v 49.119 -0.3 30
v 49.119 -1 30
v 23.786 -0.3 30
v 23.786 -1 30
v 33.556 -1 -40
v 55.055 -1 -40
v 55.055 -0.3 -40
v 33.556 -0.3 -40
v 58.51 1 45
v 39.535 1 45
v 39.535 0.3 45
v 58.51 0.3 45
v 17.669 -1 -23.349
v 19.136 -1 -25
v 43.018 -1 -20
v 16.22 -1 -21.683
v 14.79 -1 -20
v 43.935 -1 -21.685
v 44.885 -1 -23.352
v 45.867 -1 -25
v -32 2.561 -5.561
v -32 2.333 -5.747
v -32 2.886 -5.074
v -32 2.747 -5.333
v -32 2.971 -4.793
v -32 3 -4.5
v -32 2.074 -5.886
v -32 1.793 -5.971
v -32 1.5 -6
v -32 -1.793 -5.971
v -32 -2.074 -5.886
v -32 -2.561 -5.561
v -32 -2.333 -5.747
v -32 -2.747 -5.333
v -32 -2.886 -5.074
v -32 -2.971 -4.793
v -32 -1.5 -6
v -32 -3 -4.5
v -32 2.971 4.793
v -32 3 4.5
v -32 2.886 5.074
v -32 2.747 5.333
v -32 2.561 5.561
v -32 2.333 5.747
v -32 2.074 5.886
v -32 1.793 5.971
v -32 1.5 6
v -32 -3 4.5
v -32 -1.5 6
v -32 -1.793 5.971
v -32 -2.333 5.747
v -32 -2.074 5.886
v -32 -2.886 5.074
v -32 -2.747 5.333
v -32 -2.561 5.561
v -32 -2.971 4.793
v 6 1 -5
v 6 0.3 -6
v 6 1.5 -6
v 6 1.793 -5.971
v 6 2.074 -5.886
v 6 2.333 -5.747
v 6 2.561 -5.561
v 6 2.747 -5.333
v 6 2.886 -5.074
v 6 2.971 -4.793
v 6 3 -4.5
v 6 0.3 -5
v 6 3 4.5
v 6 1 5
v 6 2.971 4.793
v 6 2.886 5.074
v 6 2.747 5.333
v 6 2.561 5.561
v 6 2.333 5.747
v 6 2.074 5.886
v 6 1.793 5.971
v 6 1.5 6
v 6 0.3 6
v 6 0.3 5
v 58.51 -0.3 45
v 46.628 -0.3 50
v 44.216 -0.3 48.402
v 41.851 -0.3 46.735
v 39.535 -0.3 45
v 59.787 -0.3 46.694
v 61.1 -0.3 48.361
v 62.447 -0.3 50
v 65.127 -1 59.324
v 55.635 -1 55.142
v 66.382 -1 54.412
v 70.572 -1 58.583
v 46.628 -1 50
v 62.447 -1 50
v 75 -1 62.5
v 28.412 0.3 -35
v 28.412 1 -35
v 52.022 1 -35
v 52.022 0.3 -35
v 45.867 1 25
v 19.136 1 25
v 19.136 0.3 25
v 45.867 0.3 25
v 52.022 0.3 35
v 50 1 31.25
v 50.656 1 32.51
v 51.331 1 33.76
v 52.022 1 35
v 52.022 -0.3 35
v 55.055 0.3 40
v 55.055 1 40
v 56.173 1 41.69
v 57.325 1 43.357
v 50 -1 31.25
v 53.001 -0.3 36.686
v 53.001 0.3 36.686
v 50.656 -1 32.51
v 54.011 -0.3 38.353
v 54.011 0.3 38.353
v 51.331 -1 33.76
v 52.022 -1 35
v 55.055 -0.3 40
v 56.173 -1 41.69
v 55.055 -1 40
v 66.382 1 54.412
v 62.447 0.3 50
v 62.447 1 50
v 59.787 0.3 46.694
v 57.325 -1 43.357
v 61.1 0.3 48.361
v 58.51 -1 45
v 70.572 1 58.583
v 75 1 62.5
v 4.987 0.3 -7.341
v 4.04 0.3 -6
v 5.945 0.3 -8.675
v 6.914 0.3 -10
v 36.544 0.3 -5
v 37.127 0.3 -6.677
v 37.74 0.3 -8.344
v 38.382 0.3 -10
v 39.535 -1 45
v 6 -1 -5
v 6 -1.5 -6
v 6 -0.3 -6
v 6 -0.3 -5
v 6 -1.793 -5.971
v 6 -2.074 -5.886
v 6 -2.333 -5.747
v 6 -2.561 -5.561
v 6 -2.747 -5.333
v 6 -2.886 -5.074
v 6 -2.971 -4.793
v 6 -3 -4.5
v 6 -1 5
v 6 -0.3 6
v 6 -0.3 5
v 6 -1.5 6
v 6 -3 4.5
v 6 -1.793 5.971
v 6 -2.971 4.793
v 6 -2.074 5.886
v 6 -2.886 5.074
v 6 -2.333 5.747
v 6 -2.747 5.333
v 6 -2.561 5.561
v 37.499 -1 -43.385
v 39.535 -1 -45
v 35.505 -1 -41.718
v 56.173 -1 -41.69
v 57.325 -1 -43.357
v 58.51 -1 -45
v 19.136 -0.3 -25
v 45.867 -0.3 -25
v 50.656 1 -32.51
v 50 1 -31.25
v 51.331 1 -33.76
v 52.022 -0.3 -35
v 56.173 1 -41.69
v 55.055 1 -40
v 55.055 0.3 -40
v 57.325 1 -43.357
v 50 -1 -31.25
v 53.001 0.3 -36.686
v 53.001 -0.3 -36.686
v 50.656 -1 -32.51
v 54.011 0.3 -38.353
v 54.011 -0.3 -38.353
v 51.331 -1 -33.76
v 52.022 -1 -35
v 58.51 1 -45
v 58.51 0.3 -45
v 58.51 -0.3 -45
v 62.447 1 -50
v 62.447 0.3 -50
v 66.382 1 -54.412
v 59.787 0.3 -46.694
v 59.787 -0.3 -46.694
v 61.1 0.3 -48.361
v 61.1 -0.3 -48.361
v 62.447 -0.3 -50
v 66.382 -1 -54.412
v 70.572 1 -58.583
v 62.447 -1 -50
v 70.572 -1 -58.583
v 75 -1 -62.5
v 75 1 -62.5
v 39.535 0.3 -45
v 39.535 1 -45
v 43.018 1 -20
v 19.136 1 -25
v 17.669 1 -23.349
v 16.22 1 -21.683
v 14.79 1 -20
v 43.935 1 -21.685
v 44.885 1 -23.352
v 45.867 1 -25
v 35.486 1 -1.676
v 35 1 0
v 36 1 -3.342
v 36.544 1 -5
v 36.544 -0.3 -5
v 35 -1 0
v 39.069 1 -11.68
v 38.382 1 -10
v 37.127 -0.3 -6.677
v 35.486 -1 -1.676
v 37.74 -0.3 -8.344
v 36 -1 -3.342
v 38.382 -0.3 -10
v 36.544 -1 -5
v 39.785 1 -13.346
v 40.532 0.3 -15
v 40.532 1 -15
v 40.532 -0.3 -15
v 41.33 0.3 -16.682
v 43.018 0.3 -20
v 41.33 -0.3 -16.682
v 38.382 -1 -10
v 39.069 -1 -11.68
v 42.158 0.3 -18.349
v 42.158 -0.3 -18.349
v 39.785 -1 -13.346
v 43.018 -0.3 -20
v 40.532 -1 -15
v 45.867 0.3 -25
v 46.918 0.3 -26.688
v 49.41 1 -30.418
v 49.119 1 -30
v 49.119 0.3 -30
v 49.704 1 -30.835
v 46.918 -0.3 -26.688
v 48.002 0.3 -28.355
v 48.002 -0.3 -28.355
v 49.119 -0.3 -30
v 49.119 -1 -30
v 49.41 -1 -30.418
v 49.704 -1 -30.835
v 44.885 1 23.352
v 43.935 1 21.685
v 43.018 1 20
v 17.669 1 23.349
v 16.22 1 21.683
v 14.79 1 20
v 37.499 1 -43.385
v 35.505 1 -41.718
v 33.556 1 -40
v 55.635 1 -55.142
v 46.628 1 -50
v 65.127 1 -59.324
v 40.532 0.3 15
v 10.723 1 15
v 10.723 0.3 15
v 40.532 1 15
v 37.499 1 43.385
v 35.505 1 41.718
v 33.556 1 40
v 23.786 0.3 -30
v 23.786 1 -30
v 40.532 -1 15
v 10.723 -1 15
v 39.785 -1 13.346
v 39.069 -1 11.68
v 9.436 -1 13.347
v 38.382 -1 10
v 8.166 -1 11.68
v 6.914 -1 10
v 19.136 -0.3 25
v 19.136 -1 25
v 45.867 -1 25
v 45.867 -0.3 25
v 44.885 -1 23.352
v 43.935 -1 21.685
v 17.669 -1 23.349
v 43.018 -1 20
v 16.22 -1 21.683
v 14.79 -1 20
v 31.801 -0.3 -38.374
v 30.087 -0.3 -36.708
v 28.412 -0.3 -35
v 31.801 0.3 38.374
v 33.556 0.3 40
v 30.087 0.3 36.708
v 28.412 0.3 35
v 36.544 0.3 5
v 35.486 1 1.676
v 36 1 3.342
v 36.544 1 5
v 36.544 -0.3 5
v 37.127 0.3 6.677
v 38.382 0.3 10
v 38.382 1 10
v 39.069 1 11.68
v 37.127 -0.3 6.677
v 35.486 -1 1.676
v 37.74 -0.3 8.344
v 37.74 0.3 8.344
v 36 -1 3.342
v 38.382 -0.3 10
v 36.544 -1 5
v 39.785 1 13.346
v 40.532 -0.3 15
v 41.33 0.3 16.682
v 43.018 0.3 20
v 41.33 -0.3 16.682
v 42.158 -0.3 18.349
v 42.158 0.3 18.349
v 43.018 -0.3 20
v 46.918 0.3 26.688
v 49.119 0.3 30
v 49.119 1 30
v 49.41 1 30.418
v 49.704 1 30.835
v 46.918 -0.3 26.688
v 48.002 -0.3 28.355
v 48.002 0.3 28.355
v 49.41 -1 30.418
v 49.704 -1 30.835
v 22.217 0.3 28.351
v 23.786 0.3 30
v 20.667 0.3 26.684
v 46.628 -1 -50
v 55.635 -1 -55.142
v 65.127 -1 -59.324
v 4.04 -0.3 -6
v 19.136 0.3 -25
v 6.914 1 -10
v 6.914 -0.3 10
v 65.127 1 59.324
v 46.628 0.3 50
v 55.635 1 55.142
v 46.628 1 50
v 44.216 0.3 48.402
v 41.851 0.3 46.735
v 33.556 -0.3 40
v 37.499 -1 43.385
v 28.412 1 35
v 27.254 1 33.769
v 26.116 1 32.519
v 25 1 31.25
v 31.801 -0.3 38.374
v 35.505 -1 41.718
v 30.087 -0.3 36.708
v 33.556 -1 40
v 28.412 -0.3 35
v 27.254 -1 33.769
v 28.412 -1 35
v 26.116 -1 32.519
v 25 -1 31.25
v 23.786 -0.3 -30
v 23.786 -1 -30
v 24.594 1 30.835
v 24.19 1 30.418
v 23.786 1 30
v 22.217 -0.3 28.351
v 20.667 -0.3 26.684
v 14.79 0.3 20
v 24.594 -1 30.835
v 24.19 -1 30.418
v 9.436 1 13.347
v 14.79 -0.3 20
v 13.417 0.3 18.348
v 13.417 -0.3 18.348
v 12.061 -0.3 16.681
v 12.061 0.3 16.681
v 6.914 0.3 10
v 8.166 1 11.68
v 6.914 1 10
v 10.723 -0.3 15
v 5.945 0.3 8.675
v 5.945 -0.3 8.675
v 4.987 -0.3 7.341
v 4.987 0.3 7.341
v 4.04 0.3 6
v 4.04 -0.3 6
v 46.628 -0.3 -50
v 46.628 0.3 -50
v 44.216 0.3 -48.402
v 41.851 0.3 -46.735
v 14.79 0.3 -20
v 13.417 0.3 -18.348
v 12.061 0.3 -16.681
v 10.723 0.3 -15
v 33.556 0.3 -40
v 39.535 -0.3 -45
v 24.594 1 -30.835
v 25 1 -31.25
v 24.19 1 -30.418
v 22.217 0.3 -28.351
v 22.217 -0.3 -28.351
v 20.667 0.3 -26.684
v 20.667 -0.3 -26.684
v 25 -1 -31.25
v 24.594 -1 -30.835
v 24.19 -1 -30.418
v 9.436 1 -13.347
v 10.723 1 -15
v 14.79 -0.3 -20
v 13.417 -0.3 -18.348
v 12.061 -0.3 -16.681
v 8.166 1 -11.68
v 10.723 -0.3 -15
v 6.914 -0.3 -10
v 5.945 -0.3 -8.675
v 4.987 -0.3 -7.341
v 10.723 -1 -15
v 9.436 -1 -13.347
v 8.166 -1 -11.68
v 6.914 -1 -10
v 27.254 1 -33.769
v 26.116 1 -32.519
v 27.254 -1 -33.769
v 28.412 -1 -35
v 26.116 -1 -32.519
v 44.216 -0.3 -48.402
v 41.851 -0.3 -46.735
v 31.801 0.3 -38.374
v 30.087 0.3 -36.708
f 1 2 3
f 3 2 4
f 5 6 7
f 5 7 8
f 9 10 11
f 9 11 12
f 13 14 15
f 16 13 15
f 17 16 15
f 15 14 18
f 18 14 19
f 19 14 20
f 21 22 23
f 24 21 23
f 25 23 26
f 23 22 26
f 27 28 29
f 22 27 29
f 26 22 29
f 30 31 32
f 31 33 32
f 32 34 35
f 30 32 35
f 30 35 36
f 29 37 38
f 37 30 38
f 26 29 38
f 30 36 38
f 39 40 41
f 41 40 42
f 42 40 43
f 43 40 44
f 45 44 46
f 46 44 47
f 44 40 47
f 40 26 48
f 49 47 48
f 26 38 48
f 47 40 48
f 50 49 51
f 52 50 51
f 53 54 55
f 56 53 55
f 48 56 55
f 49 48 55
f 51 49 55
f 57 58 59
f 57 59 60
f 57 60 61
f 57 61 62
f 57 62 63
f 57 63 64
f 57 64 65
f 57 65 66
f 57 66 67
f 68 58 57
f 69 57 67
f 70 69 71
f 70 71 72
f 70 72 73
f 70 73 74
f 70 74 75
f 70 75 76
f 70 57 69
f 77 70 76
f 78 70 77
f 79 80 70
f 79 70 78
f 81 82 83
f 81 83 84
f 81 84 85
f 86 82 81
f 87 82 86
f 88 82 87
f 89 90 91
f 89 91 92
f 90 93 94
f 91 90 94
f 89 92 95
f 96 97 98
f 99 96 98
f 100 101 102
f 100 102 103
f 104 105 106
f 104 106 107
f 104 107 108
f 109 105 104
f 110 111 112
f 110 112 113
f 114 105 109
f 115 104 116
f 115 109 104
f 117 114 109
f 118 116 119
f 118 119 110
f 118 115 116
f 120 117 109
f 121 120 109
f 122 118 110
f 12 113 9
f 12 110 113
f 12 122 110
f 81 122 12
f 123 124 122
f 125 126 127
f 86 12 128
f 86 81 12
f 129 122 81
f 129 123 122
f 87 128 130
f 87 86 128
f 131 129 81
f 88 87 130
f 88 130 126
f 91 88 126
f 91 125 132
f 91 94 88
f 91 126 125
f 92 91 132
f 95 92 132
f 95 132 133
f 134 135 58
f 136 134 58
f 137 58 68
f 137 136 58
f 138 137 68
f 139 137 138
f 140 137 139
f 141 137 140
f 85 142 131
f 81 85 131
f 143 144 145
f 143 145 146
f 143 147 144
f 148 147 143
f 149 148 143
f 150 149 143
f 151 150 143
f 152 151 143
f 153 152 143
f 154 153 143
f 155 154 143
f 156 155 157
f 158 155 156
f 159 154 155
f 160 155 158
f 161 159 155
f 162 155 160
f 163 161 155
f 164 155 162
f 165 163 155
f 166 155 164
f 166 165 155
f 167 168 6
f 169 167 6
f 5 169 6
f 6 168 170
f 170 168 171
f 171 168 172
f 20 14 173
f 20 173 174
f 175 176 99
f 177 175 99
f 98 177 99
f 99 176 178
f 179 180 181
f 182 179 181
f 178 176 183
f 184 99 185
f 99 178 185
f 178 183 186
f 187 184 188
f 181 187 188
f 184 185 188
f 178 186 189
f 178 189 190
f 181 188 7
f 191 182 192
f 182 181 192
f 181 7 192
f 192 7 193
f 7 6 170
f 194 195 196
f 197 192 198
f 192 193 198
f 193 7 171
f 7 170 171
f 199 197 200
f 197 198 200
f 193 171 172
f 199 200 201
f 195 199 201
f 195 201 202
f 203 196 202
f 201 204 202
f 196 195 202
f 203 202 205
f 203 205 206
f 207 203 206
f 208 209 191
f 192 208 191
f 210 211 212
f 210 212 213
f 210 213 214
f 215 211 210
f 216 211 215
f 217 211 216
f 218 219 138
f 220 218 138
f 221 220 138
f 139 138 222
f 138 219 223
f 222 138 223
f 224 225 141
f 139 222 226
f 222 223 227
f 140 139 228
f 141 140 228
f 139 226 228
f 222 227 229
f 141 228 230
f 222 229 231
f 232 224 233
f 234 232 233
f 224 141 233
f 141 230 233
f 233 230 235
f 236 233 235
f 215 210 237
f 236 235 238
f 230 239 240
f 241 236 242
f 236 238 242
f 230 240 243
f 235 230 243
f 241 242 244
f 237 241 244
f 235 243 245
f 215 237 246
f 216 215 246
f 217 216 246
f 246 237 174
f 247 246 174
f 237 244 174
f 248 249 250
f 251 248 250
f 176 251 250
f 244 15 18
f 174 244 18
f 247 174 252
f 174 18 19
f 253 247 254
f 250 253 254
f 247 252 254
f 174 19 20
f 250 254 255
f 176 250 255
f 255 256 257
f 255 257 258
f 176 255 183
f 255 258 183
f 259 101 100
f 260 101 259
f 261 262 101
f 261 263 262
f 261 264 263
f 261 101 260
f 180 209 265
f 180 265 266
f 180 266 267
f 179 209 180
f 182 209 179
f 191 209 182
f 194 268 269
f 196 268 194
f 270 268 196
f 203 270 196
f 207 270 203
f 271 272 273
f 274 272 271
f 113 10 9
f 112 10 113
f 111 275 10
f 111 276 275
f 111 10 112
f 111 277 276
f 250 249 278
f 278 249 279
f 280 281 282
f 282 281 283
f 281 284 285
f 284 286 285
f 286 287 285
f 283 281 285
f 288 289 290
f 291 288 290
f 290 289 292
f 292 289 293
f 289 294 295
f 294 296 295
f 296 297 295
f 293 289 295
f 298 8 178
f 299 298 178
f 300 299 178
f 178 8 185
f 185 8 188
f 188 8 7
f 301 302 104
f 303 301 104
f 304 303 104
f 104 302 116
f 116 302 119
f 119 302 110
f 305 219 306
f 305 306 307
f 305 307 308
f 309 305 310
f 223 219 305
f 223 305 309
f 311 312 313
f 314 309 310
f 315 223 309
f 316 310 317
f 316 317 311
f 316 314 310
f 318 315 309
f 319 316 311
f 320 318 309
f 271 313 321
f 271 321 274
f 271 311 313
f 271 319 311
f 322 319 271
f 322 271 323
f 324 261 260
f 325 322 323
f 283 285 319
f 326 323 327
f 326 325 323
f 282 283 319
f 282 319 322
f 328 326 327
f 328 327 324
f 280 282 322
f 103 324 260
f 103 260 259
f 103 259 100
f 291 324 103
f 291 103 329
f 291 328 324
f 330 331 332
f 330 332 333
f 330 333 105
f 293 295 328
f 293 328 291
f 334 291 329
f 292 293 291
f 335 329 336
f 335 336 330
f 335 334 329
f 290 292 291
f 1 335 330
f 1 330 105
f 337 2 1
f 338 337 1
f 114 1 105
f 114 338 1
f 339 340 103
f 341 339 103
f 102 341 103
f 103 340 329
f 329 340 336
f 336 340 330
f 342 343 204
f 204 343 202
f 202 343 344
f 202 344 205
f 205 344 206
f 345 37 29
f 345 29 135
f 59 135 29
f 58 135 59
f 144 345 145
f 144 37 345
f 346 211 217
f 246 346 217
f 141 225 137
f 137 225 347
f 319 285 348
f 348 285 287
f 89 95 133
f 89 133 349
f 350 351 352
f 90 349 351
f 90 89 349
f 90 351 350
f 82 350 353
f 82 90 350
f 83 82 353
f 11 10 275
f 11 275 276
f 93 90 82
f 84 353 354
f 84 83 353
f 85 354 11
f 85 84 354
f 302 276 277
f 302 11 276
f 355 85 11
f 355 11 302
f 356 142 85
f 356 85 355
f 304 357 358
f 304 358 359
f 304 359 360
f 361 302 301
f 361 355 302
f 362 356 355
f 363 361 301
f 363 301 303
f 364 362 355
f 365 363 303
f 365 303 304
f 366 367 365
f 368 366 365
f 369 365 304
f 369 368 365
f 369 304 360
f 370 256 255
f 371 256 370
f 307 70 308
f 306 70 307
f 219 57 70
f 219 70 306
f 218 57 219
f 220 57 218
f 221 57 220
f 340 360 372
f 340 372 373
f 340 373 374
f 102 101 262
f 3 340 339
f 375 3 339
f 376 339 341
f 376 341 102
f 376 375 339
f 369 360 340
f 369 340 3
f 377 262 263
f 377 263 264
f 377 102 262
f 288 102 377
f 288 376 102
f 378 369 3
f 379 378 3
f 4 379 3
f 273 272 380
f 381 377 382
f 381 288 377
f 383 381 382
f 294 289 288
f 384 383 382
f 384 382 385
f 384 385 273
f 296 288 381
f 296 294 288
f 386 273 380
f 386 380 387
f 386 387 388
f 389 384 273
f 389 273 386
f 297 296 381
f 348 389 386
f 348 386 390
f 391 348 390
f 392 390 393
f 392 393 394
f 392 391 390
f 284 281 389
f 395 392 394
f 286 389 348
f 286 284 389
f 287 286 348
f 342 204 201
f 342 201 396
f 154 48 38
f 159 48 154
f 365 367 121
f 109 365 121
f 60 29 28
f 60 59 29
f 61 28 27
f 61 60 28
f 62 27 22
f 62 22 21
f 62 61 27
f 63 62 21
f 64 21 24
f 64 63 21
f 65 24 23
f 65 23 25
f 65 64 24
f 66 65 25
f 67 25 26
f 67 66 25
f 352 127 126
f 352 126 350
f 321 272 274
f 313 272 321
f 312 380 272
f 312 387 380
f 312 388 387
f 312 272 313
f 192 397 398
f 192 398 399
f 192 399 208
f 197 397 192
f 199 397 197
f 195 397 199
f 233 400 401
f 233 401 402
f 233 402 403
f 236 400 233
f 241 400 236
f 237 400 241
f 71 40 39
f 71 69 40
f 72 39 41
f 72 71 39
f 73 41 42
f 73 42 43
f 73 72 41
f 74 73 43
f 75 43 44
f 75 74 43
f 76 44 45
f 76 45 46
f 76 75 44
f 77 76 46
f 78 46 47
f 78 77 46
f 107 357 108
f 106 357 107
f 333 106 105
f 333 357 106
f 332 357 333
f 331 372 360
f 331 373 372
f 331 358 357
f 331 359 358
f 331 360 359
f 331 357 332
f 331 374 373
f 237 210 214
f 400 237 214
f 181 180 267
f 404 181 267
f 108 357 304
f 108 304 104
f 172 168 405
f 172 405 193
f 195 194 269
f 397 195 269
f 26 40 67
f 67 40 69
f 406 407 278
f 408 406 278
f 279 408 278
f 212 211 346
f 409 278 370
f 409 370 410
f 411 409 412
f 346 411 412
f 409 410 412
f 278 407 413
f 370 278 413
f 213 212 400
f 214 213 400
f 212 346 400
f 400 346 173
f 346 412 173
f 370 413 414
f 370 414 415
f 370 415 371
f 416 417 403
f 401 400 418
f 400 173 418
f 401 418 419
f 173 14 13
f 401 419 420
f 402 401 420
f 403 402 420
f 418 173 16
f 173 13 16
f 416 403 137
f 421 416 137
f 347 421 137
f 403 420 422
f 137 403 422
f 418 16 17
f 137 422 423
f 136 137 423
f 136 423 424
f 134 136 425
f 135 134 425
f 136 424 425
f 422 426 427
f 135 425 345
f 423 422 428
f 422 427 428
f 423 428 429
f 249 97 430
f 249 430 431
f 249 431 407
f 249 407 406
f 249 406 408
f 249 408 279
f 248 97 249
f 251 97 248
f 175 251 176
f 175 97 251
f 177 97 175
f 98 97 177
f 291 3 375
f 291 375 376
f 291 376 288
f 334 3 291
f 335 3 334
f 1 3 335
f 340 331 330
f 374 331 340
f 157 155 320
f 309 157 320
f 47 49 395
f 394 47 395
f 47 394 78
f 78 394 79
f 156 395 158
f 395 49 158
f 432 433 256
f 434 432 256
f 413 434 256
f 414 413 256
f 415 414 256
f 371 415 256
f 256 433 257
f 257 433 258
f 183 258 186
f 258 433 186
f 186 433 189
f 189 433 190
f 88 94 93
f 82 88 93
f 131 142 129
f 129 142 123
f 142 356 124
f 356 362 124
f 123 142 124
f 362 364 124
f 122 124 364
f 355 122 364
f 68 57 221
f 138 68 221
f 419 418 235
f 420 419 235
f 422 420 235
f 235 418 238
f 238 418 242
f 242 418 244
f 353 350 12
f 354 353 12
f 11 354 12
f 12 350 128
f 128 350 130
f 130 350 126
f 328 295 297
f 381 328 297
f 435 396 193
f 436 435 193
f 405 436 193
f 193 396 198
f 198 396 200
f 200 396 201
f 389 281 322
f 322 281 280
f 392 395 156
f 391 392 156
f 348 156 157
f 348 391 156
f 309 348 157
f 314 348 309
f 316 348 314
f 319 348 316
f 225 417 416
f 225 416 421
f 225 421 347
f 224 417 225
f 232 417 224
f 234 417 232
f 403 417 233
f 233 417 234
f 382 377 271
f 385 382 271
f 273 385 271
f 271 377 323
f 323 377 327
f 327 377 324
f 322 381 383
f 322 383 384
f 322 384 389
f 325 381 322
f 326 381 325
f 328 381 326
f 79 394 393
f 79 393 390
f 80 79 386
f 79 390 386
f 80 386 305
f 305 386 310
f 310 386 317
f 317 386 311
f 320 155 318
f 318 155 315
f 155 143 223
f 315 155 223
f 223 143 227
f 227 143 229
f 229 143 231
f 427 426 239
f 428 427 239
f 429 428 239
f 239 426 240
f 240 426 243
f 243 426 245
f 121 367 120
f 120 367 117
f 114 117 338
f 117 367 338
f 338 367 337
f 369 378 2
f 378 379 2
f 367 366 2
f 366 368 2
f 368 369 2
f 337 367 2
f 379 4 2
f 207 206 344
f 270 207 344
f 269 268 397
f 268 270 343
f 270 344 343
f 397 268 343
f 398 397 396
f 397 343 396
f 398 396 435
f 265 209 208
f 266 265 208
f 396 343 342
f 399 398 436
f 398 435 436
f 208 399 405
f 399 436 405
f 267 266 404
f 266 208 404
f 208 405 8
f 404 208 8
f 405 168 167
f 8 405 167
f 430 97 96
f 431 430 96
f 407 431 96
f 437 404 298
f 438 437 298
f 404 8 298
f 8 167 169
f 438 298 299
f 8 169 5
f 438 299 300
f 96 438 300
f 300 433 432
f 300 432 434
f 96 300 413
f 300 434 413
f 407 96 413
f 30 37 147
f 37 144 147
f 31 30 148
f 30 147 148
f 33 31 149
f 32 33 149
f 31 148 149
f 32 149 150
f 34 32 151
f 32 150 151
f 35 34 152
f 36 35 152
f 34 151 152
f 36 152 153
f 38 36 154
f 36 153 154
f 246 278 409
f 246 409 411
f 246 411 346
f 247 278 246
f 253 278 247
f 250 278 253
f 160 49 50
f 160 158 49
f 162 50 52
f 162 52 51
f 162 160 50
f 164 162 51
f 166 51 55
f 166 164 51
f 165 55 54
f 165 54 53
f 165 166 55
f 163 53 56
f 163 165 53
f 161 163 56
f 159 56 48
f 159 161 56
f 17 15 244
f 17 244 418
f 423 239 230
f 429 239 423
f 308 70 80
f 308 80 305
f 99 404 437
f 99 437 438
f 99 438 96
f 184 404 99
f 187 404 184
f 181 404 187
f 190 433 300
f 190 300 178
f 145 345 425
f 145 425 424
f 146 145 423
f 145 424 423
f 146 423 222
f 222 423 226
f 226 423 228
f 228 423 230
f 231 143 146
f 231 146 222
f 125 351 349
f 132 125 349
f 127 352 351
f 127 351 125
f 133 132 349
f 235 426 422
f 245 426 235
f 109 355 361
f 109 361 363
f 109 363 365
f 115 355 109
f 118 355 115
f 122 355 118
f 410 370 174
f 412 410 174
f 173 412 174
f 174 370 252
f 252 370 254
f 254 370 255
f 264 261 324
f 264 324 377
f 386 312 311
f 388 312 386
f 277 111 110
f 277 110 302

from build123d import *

# Parameters (mm, degrees)
F1_DEPTH         = 1
F4_DEPTH         = 0.7
F4_COPIES2_COUNT = 2
F5_W             = 38
F5_H             = 12
F6_DEPTH         = 3
F7_R             = 1.5


# Not quite as in the source:
# - a pattern or mirror of a feature is missing from the dataset's text; its kind, count and spacing are read off the source's solid


with BuildPart() as f1:
    # F0 (on Front) → F1 (new body, symmetric)
    with BuildSketch(Plane.XZ):
        with BuildLine():
            ThreePointArc((25, 31.25), (11.7164027855, 16.2518777716), (0, 0))
            Line((0, 0), (35, 0))
            ThreePointArc((35, 0), (41.1356304071, 16.2798974046), (50, 31.25))
            Line((50, 31.25), (25, 31.25))
        make_face()
        with BuildLine():
            ThreePointArc((75, 62.5), (47.6444357815, 50.6439027497), (25, 31.25))
            Line((25, 31.25), (50, 31.25))
            ThreePointArc((50, 31.25), (60.9207680237, 48.138385581), (75, 62.5))
        make_face()
    extrude(amount=F1_DEPTH, both=True)

    # F2: F1 across plane


with BuildPart() as f1_1:
    add(f1.part)
    add(f1.part.mirror(Plane.XY))

    # F3 (on face) → F4 (cut)
    with BuildSketch(Plane.XZ.offset(1)):
        with BuildLine():
            Line((38.3820565676, 10), (6.9138783475, 10))
            ThreePointArc((6.9138783475, 10), (5.1100506614, 7.5137050995), (3.3446205931, 5))
            Line((3.3446205931, 5), (36.543888556, 5))
            ThreePointArc((36.543888556, 5), (37.4296717705, 7.5122424899), (38.3820565676, 10))
        make_face()
        with BuildLine():
            ThreePointArc((14.7901250767, 20), (12.736458423, 17.5163842045), (10.7230770186, 15))
            Line((10.7230770186, 15), (40.5323833312, 15))
            ThreePointArc((40.5323833312, 15), (41.7401268698, 17.5173495329), (43.0176791325, 20))
            Line((43.0176791325, 20), (14.7901250767, 20))
        make_face()
        with BuildLine():
            ThreePointArc((23.7864537922, 30), (21.4399722373, 27.5198472862), (19.1361704174, 25))
            Line((19.1361704174, 25), (45.8671764928, 25))
            ThreePointArc((45.8671764928, 25), (47.4556813757, 27.5242471055), (49.1187564845, 30))
            Line((49.1187564845, 30), (23.7864537922, 30))
        make_face()
        with BuildLine():
            ThreePointArc((33.5555945556, 40), (30.9391304542, 37.5461308043), (28.4123585311, 35))
            Line((28.4123585311, 35), (52.0223589414, 35))
            ThreePointArc((52.0223589414, 35), (53.5018795741, 37.5221680923), (55.0545103176, 40))
            Line((55.0545103176, 40), (33.5555945556, 40))
        make_face()
        with BuildLine():
            ThreePointArc((46.6278522844, 50), (43.0272085219, 47.5769747675), (39.5350905643, 45))
            Line((39.5350905643, 45), (58.5103303946, 45))
            ThreePointArc((58.5103303946, 45), (60.4389654659, 47.5313247859), (62.4471689161, 50))
            Line((62.4471689161, 50), (46.6278522844, 50))
        make_face()
    f4 = extrude(amount=-F4_DEPTH, mode=Mode.SUBTRACT)

    # F4_copies: F4 across plane
    add(f4.mirror(Plane.ZX), mode=Mode.SUBTRACT)

    # F4_copies1: F4 across plane
    add(f4.mirror(Plane(origin=(0, 0, 0), x_dir=(-1, 0, 0), z_dir=(0, 0, -1))), mode=Mode.SUBTRACT)

    # F4_copies2: F4 ×2 about axis
    f4_copies2_axis = Axis((0, 0, 0), (1, 0, 0))
    for i in range(1, F4_COPIES2_COUNT):
        add(f4.rotate(f4_copies2_axis, i * 360 / F4_COPIES2_COUNT), mode=Mode.SUBTRACT)

    # F5 (on Front) → F6 (join, symmetric)
    with BuildSketch(Plane.XZ):
        with Locations((-13, 0)):
            Rectangle(F5_W, F5_H)
    extrude(amount=F6_DEPTH, both=True)

    # F7
    f7_edges = [f1_1.edges().sort_by_distance(p)[0] for p in [
        (-13, 3, 6),
        (-13, -3, 6),
        (-13, -3, -6),
        (-13, 3, -6),
    ]]
    fillet(f7_edges, radius=F7_R)


solid = f1_1.part
